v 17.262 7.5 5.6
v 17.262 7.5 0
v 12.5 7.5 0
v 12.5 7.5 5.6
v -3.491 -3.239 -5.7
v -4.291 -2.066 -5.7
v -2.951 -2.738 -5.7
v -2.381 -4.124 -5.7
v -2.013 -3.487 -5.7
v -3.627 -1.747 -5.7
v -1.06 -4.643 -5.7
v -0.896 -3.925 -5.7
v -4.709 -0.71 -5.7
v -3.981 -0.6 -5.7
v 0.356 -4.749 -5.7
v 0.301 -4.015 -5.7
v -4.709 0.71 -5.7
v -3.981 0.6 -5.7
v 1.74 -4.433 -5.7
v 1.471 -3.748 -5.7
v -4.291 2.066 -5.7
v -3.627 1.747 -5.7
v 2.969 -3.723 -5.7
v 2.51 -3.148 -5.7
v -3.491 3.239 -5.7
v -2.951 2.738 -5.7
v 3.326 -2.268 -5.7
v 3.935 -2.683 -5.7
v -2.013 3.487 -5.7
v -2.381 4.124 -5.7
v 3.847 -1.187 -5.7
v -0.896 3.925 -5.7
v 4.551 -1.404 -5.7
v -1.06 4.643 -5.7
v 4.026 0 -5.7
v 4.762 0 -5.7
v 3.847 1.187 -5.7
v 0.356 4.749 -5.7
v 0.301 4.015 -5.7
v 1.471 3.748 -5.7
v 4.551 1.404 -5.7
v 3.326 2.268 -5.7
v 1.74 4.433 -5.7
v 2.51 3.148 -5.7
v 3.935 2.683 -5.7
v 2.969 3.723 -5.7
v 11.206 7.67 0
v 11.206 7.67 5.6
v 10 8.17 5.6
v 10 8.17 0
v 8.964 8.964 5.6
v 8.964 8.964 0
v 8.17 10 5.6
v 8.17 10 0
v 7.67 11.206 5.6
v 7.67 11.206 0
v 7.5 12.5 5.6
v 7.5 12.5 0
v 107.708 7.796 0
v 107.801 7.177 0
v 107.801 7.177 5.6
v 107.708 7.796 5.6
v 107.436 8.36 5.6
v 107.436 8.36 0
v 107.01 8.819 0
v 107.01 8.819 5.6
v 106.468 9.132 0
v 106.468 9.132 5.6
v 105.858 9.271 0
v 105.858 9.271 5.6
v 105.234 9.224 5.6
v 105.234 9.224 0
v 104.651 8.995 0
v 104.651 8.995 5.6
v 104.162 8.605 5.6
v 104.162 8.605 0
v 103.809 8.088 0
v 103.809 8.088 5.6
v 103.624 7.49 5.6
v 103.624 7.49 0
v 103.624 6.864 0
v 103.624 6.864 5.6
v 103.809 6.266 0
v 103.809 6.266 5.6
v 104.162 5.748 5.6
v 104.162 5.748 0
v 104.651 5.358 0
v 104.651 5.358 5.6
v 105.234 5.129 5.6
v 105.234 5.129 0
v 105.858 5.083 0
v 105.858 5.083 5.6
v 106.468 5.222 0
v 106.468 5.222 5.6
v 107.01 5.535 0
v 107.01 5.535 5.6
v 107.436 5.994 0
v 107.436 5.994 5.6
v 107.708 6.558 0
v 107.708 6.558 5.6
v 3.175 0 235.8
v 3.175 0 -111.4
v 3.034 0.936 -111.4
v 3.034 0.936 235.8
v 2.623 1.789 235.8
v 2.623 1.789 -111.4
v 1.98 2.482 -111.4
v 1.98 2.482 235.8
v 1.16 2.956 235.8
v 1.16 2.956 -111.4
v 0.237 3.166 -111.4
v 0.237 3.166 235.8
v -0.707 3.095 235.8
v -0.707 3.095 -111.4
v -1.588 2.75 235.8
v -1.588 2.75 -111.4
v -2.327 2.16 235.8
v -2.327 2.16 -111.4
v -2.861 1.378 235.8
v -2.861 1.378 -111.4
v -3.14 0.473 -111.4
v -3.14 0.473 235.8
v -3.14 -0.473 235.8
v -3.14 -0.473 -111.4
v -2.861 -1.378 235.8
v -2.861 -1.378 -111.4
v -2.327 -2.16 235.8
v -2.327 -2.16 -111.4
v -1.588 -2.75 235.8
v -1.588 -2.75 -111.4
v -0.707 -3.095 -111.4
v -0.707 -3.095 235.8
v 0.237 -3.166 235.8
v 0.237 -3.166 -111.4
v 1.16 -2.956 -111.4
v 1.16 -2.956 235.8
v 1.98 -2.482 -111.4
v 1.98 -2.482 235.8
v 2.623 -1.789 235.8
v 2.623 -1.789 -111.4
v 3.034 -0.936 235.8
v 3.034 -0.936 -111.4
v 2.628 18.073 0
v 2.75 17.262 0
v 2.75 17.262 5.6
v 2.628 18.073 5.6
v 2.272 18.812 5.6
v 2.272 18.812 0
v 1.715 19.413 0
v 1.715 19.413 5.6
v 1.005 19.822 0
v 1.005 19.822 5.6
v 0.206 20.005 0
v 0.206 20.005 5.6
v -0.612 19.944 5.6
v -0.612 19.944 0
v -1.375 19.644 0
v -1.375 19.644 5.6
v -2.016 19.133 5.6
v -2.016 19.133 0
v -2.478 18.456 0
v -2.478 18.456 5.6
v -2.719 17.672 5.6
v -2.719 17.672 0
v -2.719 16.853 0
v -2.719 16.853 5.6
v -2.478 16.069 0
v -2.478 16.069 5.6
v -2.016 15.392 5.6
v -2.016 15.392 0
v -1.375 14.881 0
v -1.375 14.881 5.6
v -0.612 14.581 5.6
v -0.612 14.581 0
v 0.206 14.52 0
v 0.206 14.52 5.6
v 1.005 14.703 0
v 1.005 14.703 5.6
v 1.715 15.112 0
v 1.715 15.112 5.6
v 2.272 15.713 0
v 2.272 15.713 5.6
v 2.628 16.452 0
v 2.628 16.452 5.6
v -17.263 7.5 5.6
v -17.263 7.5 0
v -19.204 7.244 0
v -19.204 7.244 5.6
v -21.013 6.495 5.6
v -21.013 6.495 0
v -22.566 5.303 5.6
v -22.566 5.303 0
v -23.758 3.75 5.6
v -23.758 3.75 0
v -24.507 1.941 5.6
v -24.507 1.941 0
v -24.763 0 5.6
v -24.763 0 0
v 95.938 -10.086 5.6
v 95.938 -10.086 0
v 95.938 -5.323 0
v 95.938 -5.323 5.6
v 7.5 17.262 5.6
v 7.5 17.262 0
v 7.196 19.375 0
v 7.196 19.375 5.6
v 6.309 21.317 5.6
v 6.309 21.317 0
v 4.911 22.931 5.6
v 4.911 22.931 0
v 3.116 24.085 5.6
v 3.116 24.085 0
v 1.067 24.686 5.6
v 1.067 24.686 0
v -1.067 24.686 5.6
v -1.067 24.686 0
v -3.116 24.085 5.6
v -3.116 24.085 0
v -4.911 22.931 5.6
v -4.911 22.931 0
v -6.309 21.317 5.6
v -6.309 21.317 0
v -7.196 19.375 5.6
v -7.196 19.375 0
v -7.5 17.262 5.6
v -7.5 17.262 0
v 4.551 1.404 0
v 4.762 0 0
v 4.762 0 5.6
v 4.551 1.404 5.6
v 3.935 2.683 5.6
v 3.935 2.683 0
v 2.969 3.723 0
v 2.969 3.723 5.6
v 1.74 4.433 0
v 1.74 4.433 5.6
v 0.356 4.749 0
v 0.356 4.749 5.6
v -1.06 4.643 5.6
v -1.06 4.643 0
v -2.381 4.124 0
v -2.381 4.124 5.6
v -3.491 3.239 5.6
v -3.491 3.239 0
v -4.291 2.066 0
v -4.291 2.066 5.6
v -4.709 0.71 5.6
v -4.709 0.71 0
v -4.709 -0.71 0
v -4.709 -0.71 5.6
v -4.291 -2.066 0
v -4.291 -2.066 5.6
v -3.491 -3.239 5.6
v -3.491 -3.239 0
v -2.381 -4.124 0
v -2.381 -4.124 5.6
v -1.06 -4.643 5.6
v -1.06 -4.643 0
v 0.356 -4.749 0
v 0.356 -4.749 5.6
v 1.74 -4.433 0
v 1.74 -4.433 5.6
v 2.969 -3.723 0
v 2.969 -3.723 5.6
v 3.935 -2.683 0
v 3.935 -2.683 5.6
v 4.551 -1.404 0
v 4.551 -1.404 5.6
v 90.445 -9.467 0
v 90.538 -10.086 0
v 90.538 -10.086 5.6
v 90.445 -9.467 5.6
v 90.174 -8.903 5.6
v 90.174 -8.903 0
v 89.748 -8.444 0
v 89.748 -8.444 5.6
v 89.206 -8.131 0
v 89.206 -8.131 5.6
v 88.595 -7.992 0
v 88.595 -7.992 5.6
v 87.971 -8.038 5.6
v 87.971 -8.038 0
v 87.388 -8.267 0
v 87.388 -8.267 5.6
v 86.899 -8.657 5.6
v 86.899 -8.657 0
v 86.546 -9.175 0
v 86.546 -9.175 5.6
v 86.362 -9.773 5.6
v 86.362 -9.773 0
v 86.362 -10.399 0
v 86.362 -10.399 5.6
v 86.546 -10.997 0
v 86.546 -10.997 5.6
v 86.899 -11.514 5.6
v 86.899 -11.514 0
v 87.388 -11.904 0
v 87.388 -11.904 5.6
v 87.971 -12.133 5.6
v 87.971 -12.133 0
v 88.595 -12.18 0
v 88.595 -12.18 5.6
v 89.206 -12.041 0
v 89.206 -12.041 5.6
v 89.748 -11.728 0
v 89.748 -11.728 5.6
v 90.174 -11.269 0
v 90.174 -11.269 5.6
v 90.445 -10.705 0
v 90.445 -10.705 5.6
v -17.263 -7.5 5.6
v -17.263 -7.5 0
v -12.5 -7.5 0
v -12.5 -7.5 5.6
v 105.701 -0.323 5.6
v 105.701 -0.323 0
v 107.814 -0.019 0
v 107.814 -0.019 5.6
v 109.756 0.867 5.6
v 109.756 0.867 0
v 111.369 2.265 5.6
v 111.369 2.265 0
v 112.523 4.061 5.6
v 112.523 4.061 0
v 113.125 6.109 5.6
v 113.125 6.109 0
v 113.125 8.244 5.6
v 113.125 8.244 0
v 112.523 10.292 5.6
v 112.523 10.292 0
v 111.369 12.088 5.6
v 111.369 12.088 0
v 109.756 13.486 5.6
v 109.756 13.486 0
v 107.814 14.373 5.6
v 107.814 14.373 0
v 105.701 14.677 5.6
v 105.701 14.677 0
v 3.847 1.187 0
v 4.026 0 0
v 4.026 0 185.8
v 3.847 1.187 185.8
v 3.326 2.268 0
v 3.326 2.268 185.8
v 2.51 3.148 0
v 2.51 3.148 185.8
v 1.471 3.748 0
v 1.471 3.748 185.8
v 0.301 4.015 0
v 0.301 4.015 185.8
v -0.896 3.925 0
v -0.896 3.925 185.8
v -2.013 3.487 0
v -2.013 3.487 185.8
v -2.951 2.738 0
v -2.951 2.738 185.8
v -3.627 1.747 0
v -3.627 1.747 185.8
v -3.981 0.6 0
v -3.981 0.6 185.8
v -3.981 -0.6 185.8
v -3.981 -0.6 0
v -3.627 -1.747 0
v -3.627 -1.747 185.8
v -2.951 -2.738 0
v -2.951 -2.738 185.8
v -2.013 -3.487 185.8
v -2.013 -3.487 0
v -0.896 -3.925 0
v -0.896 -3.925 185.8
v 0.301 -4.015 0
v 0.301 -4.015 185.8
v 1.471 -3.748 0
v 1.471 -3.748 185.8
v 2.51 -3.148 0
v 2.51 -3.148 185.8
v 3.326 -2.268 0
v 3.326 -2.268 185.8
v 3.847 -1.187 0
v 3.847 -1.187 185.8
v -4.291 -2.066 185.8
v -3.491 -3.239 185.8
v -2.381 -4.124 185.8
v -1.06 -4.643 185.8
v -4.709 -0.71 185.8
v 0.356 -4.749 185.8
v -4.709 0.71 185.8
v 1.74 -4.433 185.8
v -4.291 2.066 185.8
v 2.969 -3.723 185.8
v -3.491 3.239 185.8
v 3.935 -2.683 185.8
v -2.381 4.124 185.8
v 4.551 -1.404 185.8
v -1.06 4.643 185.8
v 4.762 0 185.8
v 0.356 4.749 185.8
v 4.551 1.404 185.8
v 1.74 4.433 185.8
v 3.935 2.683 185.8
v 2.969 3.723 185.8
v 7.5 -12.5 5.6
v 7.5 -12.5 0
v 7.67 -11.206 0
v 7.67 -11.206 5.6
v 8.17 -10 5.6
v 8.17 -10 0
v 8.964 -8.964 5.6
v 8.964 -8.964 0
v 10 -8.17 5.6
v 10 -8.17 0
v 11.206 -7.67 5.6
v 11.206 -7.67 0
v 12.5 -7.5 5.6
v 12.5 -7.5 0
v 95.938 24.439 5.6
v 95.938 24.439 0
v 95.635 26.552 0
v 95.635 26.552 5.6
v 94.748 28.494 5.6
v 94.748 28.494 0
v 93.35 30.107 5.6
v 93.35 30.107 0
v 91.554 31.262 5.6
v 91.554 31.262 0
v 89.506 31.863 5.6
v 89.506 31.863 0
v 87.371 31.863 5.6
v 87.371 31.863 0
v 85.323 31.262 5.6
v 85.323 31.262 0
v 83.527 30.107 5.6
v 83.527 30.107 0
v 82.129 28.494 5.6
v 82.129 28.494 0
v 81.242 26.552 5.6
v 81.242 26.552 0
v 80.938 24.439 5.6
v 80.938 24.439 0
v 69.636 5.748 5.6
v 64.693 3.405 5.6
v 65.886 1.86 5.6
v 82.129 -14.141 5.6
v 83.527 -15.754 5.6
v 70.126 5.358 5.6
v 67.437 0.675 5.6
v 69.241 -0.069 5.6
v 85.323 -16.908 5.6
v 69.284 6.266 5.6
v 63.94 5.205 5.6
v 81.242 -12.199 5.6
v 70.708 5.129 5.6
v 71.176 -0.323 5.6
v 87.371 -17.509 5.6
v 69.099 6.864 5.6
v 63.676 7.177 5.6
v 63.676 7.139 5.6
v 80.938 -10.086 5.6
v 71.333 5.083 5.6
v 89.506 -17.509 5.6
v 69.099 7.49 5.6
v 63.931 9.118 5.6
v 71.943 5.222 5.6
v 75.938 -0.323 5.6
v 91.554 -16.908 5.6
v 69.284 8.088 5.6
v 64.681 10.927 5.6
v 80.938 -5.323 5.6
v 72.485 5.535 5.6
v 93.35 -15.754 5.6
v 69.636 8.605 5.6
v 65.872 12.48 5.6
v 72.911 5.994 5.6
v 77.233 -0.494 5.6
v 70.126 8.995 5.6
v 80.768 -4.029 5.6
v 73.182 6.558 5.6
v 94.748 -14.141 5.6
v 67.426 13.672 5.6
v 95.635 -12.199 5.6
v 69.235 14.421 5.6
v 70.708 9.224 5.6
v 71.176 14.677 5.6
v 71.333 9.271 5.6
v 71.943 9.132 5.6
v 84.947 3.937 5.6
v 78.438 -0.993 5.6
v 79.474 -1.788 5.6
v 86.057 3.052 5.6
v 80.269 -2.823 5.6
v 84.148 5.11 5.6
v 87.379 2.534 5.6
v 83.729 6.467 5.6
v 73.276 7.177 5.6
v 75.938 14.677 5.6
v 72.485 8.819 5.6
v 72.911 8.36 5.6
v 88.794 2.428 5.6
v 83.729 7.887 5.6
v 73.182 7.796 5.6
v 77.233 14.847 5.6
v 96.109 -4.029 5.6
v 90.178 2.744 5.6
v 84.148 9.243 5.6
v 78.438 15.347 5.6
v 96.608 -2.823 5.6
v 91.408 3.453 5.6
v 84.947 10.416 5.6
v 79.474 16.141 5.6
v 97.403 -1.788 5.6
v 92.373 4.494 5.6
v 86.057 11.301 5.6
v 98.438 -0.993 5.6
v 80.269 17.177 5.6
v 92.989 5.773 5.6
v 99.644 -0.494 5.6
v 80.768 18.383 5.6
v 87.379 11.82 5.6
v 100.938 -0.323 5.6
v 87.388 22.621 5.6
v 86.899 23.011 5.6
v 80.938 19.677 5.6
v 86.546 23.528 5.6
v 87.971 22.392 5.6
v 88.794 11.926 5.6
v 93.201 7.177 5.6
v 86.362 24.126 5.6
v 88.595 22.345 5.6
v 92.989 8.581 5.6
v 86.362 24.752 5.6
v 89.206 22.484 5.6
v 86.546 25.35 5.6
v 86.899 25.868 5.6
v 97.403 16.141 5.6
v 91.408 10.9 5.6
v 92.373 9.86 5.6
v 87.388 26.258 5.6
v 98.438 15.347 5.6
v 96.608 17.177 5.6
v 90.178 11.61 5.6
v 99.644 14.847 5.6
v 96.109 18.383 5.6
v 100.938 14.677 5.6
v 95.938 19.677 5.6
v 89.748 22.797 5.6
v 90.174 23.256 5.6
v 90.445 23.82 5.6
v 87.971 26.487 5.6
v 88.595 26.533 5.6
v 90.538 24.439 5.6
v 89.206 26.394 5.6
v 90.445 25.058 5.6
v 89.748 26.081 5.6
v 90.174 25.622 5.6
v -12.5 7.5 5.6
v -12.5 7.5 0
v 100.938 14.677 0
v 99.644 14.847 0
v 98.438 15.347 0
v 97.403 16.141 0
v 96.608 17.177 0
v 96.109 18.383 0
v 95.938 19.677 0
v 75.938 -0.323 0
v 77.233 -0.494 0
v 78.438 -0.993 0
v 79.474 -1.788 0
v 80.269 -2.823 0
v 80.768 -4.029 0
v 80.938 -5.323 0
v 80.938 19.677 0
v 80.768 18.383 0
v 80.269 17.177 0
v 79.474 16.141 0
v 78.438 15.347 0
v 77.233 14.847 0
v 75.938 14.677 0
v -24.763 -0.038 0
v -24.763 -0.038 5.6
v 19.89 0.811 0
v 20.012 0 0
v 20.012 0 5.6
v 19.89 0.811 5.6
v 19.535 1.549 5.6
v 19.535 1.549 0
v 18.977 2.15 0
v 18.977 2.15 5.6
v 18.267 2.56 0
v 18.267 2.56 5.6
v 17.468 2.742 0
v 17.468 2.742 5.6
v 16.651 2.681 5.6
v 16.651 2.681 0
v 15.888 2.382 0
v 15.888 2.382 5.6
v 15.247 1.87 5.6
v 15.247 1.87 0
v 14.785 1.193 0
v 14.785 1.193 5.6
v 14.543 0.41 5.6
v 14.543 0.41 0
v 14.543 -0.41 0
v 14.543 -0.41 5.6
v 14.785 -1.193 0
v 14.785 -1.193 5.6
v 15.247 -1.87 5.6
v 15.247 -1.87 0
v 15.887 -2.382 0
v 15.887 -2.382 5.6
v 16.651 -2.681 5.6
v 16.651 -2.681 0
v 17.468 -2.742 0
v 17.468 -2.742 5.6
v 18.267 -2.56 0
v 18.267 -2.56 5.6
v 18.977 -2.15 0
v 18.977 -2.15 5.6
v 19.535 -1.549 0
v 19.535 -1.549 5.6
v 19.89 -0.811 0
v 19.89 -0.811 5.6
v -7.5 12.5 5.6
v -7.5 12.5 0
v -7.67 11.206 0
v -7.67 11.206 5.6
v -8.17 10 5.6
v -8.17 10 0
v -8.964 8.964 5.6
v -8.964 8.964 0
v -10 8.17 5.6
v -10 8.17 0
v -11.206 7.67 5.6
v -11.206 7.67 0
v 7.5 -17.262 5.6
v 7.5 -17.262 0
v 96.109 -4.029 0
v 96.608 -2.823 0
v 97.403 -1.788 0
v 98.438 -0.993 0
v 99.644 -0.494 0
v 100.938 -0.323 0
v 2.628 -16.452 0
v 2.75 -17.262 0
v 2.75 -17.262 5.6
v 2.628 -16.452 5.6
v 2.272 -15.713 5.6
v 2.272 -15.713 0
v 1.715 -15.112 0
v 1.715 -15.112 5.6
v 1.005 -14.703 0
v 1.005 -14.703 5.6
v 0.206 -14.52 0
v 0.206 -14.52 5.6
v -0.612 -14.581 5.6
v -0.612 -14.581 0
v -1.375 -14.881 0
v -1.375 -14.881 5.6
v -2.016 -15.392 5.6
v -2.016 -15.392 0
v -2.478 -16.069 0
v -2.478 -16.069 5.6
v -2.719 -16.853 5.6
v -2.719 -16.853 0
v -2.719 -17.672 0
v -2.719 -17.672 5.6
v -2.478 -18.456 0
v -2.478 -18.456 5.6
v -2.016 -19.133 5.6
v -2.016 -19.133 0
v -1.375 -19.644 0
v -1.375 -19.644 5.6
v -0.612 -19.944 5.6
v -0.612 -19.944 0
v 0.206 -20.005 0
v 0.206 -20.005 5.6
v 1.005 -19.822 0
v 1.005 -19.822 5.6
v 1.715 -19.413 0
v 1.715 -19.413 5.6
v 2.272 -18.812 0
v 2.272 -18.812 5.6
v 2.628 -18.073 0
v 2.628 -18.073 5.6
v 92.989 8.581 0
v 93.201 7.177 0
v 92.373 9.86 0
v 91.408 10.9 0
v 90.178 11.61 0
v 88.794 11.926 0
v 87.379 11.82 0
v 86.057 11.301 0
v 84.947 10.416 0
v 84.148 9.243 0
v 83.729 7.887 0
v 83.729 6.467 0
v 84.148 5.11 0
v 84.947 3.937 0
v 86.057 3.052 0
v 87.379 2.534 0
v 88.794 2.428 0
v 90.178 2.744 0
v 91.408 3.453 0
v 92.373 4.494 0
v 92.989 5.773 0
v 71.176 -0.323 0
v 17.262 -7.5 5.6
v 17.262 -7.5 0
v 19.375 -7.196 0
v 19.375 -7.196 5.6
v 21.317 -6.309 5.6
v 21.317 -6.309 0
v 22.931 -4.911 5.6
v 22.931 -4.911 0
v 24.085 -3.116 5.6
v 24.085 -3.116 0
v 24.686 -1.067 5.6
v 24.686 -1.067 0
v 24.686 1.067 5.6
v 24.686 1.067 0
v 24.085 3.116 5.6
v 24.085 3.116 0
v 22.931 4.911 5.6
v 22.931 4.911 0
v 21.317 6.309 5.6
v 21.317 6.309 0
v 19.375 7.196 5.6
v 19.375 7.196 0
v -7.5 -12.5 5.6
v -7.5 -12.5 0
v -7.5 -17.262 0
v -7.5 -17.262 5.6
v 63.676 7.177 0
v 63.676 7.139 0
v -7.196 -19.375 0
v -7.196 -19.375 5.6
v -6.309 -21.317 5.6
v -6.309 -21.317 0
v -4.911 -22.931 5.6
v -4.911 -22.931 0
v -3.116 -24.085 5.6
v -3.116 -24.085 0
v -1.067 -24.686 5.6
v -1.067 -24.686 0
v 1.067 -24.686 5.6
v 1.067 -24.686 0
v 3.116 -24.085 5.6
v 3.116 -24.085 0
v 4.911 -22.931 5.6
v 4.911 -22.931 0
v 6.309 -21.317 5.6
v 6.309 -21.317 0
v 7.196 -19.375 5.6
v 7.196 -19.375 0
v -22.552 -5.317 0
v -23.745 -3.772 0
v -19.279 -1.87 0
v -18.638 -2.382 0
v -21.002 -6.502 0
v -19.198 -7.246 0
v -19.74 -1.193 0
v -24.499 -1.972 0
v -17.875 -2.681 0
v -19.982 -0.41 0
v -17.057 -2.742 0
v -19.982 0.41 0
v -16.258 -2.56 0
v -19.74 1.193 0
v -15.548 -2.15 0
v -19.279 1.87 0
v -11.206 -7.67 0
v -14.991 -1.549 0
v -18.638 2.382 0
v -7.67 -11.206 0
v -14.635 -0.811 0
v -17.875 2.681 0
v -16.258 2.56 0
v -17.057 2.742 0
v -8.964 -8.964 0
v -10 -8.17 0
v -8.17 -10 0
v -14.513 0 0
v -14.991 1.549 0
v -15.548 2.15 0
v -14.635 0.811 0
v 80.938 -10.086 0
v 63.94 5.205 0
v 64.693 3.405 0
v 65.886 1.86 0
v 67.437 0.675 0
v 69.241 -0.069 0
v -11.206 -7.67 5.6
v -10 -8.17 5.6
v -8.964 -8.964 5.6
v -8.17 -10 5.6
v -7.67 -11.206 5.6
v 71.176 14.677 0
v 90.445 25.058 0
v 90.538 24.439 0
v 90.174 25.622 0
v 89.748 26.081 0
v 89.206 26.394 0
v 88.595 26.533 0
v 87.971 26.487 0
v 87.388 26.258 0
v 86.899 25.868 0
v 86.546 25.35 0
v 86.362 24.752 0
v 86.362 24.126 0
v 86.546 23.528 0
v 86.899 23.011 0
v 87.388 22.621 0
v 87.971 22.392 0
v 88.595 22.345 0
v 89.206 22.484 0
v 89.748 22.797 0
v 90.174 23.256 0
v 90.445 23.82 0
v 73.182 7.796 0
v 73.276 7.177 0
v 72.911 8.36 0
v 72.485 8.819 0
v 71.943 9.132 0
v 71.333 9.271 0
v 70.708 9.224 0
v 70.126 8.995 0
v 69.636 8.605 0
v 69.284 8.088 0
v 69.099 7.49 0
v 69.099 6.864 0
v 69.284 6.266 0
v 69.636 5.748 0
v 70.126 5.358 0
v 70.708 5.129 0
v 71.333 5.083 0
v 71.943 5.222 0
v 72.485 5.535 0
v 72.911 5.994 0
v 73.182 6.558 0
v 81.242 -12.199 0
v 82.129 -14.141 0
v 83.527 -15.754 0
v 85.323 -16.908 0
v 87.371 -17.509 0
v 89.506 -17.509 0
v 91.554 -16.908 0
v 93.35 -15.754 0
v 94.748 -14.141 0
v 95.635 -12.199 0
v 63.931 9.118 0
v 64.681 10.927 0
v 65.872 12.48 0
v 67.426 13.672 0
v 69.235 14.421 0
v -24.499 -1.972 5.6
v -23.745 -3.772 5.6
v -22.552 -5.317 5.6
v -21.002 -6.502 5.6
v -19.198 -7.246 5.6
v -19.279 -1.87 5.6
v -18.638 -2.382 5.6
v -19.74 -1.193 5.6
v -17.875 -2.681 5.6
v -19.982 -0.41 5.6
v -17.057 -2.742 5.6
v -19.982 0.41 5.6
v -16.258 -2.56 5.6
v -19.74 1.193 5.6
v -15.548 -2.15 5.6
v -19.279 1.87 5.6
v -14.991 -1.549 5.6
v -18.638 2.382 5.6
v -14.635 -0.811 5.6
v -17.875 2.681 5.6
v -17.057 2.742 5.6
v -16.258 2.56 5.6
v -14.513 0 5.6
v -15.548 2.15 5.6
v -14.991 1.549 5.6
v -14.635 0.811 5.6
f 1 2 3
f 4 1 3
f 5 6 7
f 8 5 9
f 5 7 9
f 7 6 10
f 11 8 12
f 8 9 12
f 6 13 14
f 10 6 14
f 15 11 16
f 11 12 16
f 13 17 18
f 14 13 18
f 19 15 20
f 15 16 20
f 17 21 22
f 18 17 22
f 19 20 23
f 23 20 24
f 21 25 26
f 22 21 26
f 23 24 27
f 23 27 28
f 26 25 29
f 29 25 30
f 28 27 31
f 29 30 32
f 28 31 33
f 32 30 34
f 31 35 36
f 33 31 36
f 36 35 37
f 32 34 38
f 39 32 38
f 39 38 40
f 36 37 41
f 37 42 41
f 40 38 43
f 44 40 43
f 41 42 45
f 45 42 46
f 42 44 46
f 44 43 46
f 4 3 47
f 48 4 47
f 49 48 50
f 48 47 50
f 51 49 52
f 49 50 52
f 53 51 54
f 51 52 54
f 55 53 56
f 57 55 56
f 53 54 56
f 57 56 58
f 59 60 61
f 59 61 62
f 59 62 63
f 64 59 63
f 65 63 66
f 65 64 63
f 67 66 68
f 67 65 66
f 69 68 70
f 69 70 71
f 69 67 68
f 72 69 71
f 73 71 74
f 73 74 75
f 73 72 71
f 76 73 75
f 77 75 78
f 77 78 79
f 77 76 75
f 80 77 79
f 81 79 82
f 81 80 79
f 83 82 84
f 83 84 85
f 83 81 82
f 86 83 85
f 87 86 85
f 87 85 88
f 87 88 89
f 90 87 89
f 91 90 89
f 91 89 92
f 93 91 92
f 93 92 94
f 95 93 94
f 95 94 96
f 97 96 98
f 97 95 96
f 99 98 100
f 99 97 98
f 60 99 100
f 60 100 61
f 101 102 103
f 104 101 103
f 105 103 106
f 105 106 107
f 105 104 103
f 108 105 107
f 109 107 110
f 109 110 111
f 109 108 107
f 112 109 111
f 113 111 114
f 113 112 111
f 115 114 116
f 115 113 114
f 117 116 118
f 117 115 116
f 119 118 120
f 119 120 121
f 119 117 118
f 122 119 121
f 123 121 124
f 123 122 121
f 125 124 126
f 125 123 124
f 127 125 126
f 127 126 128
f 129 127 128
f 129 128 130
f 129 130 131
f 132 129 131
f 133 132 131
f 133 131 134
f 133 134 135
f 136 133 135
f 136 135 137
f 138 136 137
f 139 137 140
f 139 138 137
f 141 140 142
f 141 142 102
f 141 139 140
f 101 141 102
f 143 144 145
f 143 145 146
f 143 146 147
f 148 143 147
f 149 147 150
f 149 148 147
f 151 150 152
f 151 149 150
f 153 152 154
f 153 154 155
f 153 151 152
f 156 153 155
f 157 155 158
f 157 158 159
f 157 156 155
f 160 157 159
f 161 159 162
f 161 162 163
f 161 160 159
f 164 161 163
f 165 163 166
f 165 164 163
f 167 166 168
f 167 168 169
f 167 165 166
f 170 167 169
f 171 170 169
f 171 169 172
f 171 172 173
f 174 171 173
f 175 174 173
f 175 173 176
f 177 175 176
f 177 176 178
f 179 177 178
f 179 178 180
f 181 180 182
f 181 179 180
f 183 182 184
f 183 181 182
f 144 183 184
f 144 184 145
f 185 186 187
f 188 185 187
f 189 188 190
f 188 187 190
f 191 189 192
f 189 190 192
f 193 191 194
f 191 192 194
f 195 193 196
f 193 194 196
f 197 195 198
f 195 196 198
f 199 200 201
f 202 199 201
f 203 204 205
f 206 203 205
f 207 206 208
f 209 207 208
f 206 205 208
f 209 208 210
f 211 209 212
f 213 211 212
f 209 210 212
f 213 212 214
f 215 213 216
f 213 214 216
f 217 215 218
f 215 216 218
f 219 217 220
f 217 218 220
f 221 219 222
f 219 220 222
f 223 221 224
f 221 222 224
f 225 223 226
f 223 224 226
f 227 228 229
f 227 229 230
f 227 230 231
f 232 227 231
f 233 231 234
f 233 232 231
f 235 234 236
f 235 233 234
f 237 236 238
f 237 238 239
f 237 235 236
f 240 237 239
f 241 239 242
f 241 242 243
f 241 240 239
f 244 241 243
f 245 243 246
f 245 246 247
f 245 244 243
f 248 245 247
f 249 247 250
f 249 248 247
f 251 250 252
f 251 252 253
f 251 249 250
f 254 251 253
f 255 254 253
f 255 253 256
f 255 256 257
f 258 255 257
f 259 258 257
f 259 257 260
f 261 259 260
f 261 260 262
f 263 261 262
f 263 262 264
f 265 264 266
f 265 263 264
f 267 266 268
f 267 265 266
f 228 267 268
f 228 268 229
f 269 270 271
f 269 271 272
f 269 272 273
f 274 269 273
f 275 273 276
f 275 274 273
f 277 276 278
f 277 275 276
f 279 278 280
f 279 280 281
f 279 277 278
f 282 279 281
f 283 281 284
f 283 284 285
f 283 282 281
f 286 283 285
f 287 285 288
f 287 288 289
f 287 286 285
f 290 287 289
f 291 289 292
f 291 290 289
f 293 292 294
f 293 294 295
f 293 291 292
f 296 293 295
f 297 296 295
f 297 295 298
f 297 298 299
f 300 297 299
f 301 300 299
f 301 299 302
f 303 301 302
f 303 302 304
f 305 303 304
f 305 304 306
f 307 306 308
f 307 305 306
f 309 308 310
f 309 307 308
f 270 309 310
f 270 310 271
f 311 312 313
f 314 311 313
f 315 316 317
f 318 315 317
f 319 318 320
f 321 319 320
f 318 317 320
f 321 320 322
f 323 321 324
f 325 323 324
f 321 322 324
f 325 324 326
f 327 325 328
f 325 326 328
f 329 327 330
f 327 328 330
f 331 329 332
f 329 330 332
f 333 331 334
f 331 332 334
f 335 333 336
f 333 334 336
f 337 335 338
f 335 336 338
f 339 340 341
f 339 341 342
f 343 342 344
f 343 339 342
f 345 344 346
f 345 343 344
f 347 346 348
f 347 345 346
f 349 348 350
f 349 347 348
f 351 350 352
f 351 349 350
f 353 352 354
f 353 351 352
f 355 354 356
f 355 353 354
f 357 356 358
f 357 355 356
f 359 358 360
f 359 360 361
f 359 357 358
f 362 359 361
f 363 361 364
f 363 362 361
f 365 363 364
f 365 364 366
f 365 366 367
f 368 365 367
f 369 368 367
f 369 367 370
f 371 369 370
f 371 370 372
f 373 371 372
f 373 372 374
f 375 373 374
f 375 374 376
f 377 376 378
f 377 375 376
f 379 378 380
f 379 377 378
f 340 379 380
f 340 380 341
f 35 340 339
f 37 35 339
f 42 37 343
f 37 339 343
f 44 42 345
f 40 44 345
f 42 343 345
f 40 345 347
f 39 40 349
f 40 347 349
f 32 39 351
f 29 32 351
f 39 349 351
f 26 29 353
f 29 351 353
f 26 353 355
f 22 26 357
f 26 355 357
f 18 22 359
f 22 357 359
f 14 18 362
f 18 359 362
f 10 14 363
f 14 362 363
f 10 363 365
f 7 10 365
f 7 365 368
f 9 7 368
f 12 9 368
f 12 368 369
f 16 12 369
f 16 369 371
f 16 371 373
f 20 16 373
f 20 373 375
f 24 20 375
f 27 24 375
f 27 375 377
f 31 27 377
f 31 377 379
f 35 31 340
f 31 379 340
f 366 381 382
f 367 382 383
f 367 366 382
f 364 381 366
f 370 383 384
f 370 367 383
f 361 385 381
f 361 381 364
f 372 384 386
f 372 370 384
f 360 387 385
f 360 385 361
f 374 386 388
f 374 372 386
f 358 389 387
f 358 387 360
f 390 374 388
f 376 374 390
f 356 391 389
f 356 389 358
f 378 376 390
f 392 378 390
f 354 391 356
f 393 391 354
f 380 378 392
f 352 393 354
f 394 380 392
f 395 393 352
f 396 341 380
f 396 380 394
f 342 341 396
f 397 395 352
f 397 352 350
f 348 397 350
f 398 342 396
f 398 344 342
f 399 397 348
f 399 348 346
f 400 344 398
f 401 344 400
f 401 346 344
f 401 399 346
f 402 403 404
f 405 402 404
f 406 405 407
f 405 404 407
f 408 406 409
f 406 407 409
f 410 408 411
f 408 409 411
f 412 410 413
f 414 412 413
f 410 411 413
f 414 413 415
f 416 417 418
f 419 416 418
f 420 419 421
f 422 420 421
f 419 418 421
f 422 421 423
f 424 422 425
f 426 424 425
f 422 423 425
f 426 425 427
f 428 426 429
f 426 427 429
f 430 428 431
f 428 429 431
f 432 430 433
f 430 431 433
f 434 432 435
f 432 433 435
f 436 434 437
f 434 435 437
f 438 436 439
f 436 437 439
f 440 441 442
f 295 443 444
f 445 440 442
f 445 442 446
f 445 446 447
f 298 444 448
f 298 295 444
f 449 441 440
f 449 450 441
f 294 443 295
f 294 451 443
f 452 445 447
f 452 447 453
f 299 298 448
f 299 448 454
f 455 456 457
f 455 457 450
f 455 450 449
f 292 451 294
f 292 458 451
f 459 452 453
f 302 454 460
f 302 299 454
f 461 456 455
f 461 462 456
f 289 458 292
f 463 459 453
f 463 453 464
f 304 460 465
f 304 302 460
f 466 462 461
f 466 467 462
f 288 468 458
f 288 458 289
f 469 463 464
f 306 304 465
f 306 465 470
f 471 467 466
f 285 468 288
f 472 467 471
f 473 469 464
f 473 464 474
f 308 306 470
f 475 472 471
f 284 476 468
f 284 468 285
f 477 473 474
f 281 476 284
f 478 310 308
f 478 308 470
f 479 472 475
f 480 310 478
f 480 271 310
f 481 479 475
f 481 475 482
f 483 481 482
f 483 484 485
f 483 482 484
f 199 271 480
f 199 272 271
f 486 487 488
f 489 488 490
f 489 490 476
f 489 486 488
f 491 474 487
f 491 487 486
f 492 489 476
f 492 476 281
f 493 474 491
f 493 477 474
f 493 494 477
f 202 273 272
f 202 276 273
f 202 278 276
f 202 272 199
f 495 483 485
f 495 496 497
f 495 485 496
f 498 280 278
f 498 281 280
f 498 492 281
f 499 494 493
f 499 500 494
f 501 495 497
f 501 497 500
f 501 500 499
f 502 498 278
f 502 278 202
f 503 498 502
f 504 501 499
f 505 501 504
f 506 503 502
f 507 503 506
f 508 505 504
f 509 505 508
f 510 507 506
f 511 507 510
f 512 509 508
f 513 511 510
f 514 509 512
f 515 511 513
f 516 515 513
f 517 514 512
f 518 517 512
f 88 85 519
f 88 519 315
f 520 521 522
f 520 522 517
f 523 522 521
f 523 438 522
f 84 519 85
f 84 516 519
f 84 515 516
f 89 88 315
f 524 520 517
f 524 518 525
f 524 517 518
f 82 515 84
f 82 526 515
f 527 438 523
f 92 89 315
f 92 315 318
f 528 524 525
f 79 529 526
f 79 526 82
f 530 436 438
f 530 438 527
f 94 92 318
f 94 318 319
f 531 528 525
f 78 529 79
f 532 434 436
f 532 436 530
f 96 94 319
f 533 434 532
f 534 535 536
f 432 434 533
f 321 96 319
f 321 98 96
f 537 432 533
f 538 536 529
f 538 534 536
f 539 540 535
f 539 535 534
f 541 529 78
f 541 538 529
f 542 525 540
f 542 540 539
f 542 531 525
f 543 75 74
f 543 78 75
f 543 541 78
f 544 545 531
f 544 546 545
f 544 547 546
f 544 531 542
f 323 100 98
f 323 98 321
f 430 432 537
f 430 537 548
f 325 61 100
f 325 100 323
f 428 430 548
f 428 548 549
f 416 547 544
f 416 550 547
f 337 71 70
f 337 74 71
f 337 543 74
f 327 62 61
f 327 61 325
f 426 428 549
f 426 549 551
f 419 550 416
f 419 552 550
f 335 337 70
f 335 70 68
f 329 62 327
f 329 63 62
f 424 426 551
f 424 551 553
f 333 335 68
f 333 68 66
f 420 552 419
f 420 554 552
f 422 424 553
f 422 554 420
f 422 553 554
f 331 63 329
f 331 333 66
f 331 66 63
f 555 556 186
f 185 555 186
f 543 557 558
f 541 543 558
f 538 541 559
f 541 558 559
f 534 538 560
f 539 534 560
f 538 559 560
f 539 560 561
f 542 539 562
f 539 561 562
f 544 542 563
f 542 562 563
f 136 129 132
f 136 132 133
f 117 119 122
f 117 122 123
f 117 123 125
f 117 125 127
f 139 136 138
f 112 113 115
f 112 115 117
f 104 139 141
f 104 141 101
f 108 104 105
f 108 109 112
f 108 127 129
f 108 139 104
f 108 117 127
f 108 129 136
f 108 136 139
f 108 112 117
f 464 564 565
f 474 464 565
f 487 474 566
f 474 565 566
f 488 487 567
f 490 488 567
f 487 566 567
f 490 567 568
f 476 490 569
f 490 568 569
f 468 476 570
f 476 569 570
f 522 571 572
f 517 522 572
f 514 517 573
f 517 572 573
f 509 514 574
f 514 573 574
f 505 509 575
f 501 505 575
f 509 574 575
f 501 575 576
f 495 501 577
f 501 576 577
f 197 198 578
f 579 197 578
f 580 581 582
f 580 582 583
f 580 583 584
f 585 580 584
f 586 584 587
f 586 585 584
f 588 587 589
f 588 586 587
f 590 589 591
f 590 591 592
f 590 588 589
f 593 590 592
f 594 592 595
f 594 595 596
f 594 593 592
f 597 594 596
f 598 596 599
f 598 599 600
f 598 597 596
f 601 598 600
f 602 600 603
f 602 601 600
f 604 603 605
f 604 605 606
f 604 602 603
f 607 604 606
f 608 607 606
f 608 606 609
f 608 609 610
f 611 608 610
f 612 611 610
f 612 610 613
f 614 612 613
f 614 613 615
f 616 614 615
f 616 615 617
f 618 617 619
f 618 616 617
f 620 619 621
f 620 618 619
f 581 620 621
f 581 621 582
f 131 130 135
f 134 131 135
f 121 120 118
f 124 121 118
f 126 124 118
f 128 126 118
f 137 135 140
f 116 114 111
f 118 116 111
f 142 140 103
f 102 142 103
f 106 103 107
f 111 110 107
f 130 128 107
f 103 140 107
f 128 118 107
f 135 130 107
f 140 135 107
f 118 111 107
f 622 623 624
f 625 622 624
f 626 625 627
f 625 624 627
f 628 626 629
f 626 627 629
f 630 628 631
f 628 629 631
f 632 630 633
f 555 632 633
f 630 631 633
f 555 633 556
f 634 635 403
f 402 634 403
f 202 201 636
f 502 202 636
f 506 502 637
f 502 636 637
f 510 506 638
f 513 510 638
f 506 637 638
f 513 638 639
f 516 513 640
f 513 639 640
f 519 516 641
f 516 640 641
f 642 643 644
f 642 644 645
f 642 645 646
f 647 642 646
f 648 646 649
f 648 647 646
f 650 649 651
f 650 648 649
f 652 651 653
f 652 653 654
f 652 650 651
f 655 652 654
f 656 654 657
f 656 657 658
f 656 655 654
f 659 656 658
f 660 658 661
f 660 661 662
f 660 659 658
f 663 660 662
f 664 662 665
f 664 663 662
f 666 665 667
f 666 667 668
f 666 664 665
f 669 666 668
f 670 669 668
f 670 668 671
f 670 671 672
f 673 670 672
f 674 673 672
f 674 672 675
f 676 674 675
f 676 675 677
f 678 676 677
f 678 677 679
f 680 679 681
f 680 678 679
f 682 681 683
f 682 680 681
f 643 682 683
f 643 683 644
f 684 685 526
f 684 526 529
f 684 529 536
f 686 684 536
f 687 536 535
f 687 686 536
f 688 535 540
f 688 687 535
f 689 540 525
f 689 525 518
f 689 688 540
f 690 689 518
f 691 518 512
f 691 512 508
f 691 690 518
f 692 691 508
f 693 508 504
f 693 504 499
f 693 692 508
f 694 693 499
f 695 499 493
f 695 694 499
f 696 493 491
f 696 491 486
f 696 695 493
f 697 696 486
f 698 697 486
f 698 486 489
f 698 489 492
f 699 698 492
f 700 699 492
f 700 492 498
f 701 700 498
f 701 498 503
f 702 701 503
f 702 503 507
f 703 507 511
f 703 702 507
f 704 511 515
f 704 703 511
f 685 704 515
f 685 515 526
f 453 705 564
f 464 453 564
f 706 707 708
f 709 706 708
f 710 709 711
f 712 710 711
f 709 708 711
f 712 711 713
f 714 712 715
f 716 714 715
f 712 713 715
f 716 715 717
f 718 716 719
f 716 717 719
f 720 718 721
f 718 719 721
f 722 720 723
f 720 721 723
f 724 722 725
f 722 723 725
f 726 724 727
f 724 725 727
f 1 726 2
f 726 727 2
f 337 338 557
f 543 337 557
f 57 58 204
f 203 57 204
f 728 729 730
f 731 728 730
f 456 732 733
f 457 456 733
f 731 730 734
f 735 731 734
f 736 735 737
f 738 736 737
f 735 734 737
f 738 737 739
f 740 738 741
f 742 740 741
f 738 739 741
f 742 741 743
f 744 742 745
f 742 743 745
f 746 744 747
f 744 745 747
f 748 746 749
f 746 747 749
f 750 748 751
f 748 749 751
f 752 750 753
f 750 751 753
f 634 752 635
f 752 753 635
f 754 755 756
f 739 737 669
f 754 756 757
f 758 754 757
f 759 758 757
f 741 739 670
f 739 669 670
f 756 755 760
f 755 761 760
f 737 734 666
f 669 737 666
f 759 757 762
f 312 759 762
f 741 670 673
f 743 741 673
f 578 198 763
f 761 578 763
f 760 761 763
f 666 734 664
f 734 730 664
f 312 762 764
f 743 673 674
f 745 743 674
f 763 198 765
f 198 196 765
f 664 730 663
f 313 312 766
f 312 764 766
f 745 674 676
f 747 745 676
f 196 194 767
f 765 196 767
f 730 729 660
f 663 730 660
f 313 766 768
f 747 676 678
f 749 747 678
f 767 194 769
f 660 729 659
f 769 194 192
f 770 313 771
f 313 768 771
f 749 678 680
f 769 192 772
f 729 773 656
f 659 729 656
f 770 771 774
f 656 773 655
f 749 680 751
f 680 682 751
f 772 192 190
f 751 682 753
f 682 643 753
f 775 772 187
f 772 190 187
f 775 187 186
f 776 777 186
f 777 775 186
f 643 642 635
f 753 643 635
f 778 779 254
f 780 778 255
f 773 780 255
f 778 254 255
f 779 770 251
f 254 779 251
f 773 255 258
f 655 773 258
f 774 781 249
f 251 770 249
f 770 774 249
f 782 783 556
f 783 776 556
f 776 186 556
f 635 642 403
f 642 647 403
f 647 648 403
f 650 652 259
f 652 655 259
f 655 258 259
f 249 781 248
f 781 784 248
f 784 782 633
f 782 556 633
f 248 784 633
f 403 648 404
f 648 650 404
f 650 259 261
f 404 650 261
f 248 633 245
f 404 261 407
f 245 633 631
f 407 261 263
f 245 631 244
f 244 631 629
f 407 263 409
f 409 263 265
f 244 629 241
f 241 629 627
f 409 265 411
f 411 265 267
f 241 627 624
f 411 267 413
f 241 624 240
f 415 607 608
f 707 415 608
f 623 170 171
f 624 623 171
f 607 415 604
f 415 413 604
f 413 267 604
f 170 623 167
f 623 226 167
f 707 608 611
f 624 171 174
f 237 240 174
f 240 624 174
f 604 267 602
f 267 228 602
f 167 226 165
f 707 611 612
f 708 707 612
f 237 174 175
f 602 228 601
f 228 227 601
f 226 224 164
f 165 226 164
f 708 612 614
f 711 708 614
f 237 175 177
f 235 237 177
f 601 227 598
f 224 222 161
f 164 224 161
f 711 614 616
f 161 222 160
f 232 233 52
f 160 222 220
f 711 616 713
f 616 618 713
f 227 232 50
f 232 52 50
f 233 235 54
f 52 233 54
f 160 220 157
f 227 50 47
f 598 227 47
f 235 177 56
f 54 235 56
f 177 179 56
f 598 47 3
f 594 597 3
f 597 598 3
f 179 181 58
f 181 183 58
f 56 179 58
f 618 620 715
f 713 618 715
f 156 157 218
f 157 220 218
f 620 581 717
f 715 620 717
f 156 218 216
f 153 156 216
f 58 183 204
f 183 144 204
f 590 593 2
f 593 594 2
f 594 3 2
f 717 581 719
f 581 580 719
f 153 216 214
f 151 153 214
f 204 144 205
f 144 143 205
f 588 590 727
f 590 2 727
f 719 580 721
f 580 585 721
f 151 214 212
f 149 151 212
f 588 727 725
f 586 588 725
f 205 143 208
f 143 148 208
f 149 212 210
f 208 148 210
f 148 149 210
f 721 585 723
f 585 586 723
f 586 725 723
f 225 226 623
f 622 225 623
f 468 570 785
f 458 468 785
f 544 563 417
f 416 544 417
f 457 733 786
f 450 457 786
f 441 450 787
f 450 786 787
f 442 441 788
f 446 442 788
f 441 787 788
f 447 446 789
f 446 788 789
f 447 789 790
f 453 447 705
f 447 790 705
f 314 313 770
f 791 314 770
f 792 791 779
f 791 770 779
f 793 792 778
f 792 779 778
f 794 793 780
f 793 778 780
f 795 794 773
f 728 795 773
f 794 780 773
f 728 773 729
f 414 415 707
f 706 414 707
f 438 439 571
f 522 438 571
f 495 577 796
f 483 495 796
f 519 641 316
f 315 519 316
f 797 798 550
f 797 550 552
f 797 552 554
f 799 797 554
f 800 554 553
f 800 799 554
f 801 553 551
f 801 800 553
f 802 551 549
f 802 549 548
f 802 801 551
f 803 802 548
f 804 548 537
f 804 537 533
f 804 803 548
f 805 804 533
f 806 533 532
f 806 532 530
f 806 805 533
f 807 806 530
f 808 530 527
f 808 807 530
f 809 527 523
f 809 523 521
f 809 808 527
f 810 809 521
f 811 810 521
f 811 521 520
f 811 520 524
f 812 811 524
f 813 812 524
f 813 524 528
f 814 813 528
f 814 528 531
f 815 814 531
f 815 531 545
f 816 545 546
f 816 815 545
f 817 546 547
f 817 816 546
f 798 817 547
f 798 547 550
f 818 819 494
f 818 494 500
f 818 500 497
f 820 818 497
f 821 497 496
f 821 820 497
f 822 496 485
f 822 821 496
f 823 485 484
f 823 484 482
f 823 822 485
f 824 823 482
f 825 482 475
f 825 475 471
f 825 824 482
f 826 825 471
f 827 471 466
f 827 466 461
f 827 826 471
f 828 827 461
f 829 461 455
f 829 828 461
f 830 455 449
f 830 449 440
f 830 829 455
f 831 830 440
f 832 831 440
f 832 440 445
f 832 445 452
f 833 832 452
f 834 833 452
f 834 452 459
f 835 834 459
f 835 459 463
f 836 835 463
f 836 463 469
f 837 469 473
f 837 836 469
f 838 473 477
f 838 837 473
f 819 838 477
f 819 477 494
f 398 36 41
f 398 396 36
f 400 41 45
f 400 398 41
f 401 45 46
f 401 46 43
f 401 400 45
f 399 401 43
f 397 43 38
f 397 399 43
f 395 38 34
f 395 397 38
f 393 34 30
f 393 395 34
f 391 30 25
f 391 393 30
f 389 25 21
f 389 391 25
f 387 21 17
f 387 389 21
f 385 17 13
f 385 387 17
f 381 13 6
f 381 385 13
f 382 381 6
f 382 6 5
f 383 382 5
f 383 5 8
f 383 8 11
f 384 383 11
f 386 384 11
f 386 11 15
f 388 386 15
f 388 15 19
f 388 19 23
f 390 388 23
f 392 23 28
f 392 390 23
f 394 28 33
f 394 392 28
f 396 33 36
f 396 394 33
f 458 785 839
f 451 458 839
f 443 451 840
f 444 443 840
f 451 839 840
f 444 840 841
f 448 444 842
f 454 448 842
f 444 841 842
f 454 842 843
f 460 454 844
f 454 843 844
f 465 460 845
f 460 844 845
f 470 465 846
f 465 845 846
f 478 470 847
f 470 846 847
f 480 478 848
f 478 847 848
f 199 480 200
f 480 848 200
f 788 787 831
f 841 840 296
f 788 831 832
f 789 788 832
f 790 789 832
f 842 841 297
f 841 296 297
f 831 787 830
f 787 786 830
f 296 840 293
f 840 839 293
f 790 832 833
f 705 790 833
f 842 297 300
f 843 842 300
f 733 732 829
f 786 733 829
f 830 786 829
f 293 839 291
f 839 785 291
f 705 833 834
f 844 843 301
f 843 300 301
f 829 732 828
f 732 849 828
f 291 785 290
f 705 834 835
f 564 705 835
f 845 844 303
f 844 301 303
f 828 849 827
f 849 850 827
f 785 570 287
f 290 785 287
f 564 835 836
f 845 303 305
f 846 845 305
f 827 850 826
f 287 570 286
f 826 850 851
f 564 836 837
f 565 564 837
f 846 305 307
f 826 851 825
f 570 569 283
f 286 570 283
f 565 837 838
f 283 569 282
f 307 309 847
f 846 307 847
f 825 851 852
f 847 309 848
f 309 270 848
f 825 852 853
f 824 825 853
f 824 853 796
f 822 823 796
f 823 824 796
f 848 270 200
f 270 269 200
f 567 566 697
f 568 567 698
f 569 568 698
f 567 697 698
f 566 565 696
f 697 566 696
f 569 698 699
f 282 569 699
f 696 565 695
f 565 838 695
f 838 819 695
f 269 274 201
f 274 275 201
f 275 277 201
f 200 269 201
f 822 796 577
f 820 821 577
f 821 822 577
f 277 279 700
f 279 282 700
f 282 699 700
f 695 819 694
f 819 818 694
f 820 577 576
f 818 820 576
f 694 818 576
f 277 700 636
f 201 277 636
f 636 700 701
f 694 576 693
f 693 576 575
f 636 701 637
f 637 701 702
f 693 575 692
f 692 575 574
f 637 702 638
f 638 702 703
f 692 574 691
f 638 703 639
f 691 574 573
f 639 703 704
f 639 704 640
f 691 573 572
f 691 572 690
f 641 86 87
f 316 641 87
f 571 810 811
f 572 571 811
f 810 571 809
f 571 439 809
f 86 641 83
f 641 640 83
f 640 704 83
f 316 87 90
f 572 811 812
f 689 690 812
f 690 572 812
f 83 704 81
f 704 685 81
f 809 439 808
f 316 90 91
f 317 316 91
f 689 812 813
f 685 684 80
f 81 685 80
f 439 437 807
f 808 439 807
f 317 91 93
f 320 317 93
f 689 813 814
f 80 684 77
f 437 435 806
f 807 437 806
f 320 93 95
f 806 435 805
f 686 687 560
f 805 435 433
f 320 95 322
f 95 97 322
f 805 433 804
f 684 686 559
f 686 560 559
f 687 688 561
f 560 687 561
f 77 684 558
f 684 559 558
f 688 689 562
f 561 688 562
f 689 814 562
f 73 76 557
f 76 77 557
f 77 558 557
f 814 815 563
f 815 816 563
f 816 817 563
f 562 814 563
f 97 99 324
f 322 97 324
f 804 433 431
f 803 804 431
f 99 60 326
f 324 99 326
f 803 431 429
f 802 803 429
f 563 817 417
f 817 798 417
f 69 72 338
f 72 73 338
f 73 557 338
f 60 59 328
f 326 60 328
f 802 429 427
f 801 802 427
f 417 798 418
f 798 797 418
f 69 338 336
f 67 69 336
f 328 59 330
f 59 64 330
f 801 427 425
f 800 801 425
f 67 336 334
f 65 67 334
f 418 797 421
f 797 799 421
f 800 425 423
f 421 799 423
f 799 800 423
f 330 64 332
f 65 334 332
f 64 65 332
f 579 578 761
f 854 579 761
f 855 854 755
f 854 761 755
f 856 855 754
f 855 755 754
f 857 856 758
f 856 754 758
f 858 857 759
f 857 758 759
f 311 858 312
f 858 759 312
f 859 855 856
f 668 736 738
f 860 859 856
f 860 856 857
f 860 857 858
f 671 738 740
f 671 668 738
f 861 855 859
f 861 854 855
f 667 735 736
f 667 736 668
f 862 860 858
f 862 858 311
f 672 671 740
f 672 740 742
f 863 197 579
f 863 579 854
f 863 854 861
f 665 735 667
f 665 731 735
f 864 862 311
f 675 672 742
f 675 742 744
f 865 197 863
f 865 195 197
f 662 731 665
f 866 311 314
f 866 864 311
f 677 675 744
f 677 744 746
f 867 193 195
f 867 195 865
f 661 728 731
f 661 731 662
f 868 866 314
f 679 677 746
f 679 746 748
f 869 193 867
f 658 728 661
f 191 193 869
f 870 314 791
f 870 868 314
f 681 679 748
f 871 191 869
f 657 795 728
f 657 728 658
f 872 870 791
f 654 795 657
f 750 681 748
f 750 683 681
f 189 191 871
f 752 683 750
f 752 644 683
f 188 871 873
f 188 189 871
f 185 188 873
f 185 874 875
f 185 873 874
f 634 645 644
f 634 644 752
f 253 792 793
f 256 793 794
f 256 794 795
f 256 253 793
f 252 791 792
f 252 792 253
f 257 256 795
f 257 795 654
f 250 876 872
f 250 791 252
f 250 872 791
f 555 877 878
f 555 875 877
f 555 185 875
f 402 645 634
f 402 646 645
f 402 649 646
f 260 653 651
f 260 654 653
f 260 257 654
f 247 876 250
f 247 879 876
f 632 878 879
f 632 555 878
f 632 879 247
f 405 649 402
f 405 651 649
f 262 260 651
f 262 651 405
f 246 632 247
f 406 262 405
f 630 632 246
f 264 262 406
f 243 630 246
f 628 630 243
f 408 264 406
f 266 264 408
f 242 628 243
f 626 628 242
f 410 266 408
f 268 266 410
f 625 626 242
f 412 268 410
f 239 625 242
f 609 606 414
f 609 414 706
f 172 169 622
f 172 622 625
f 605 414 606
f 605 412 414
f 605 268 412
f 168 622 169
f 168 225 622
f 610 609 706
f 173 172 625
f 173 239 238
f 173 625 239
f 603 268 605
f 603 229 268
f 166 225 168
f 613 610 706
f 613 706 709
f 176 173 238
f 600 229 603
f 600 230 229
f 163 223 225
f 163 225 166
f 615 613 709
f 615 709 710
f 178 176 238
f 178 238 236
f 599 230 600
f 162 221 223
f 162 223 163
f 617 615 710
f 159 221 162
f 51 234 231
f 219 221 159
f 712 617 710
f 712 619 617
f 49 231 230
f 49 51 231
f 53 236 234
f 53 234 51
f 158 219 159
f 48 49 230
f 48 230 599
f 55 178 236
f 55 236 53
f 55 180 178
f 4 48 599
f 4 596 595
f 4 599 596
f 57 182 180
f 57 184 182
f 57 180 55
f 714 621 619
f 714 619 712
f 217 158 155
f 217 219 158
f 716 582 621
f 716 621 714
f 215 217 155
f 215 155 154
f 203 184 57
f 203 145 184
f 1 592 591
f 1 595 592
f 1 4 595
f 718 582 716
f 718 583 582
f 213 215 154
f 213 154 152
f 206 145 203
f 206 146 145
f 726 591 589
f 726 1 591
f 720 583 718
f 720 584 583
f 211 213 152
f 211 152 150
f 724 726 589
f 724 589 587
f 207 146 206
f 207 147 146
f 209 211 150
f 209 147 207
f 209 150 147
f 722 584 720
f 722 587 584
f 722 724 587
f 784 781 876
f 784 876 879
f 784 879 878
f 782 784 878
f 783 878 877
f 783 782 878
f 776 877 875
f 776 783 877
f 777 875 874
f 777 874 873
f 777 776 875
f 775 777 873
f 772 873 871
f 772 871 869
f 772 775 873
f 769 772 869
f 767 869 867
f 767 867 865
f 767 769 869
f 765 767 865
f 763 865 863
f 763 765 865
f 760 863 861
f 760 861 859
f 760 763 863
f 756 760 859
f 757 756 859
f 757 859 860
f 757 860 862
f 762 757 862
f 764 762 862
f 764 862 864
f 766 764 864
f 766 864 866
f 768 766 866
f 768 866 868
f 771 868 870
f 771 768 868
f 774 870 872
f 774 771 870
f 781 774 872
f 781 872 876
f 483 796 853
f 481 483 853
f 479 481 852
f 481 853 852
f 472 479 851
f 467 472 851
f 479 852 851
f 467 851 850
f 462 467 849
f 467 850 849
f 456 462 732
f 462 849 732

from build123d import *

# Parameters (mm, degrees)
F0_R          = 3.175
F1_DEPTH      = 235.8
F1_DEPTH_BACK = 111.4
F2_R          = 4.7625
F2_R_2        = 4.0259
F3_DEPTH      = 185.8
F3_DEPTH_BACK = 5.7
F4_R          = 2.75
F4_R_2        = 4.7625
F6_DEPTH      = 5.6
F5_R          = 2.1
F5_R_2        = 4.7625
F7_DEPTH      = 5.6


# Not quite as in the source:
# - ends of sketch curves that miss each other by under 0.0002 mm in the source are joined


with BuildPart() as f1:
    # F0 (on Top) → F1 (new body, two sides)
    with BuildSketch(Plane.XY) as f1_sk:
        Circle(F0_R)
    extrude(amount=F1_DEPTH)
    extrude(f1_sk.sketch, amount=-F1_DEPTH_BACK)


with BuildPart() as f3:
    # F2 (on Top) → F3 (new body, two sides)
    with BuildSketch(Plane.XY) as f3_sk:
        Circle(F2_R)
        Circle(F2_R_2, mode=Mode.SUBTRACT)
    extrude(amount=F3_DEPTH)
    extrude(f3_sk.sketch, amount=-F3_DEPTH_BACK)


with BuildPart() as f6:
    # F4 (on Top) → F6 (new body)
    with BuildSketch(Plane.XY):
        with BuildLine():
            ThreePointArc((7.5, 17.2625), (0, 24.7625), (-7.5, 17.2625))
            Line((-7.5, 17.2625), (-7.5, 12.5))
            ThreePointArc((-7.5, 12.5), (-8.9644660941, 8.9644660941), (-12.5, 7.5))
            Line((-12.5, 7.5), (-17.2627241709, 7.5))
            ThreePointArc((-17.2627241709, 7.5), (-22.5660250298, 5.3033008589), (-24.7627241709, 0))
            Line((-24.7627241709, 0), (-24.7626267772, -0.0382216857))
            ThreePointArc((-24.7626267772, -0.0382216857), (-22.5524943624, -5.3167970924), (-17.2627241709, -7.5))
            Line((-17.2627241709, -7.5), (-12.5, -7.5))
            ThreePointArc((-12.5, -7.5), (-8.9644660941, -8.9644660941), (-7.5, -12.5))
            Line((-7.5, -12.5), (-7.5, -17.2625))
            ThreePointArc((-7.5, -17.2625), (0, -24.7625), (7.5, -17.2625))
            Line((7.5, -17.2625), (7.5, -12.5))
            ThreePointArc((7.5, -12.5), (8.9644660941, -8.9644660941), (12.5, -7.5))
            Line((12.5, -7.5), (17.2625, -7.5))
            ThreePointArc((17.2625, -7.5), (24.7625, 0), (17.2625, 7.5))
            Line((17.2625, 7.5), (12.5, 7.5))
            ThreePointArc((12.5, 7.5), (8.9644660941, 8.9644660941), (7.5, 12.5))
            Line((7.5, 12.5), (7.5, 17.2625))
        make_face()
        with Locations((0, -17.2625)):
            Circle(F4_R, mode=Mode.SUBTRACT)
        with Locations((-17.2627241709, 0)):
            Circle(F4_R, mode=Mode.SUBTRACT)
        Circle(F4_R_2, mode=Mode.SUBTRACT)
        with Locations((17.2625, 0)):
            Circle(F4_R, mode=Mode.SUBTRACT)
        with Locations((0, 17.2625)):
            Circle(F4_R, mode=Mode.SUBTRACT)
    extrude(amount=F6_DEPTH)


with BuildPart() as f7:
    # F5 (on Top) → F7 (new body)
    with BuildSketch(Plane.XY):
        with BuildLine():
            ThreePointArc((95.9384369603, 24.4392953578), (88.4384369603, 31.9392953578), (80.9384369603, 24.4392953578))
            Line((80.9384369603, 24.4392953578), (80.9384369603, 19.6767953578))
            ThreePointArc((80.9384369603, 19.6767953578), (79.4739708663, 16.1412614519), (75.9384369603, 14.6767953578))
            Line((75.9384369603, 14.6767953578), (71.1757127894, 14.6767953578))
            ThreePointArc((71.1757127894, 14.6767953578), (65.8724119305, 12.4800962167), (63.6757127894, 7.1767953578))
            Line((63.6757127894, 7.1767953578), (63.6758101832, 7.1385736721))
            ThreePointArc((63.6758101832, 7.1385736721), (65.8859425979, 1.8599982654), (71.1757127894, -0.3232046422))
            Line((71.1757127894, -0.3232046422), (75.9384369603, -0.3232046422))
            ThreePointArc((75.9384369603, -0.3232046422), (79.4739708663, -1.7876707363), (80.9384369603, -5.3232046422))
            Line((80.9384369603, -5.3232046422), (80.9384369603, -10.0857046422))
            ThreePointArc((80.9384369603, -10.0857046422), (88.4384369603, -17.5857046422), (95.9384369603, -10.0857046422))
            Line((95.9384369603, -10.0857046422), (95.9384369603, -5.3232046422))
            ThreePointArc((95.9384369603, -5.3232046422), (97.4029030544, -1.7876707363), (100.9384369603, -0.3232046422))
            Line((100.9384369603, -0.3232046422), (105.7009369603, -0.3232046422))
            ThreePointArc((105.7009369603, -0.3232046422), (113.2009369603, 7.1767953578), (105.7009369603, 14.6767953578))
            Line((105.7009369603, 14.6767953578), (100.9384369603, 14.6767953578))
            ThreePointArc((100.9384369603, 14.6767953578), (97.4029030544, 16.1412614519), (95.9384369603, 19.6767953578))
            Line((95.9384369603, 19.6767953578), (95.9384369603, 24.4392953578))
        make_face()
        with Locations((71.1757127894, 7.1767953578)):
            Circle(F5_R, mode=Mode.SUBTRACT)
        with Locations((88.4384369603, -10.0857046422)):
            Circle(F5_R, mode=Mode.SUBTRACT)
        with Locations((88.4384369603, 7.1767953578)):
            Circle(F5_R_2, mode=Mode.SUBTRACT)
        with Locations((105.7009369603, 7.1767953578)):
            Circle(F5_R, mode=Mode.SUBTRACT)
        with Locations((88.4384369603, 24.4392953578)):
            Circle(F5_R, mode=Mode.SUBTRACT)
    extrude(amount=F7_DEPTH)


solid = Compound([f1.part, f3.part, f6.part, f7.part])
